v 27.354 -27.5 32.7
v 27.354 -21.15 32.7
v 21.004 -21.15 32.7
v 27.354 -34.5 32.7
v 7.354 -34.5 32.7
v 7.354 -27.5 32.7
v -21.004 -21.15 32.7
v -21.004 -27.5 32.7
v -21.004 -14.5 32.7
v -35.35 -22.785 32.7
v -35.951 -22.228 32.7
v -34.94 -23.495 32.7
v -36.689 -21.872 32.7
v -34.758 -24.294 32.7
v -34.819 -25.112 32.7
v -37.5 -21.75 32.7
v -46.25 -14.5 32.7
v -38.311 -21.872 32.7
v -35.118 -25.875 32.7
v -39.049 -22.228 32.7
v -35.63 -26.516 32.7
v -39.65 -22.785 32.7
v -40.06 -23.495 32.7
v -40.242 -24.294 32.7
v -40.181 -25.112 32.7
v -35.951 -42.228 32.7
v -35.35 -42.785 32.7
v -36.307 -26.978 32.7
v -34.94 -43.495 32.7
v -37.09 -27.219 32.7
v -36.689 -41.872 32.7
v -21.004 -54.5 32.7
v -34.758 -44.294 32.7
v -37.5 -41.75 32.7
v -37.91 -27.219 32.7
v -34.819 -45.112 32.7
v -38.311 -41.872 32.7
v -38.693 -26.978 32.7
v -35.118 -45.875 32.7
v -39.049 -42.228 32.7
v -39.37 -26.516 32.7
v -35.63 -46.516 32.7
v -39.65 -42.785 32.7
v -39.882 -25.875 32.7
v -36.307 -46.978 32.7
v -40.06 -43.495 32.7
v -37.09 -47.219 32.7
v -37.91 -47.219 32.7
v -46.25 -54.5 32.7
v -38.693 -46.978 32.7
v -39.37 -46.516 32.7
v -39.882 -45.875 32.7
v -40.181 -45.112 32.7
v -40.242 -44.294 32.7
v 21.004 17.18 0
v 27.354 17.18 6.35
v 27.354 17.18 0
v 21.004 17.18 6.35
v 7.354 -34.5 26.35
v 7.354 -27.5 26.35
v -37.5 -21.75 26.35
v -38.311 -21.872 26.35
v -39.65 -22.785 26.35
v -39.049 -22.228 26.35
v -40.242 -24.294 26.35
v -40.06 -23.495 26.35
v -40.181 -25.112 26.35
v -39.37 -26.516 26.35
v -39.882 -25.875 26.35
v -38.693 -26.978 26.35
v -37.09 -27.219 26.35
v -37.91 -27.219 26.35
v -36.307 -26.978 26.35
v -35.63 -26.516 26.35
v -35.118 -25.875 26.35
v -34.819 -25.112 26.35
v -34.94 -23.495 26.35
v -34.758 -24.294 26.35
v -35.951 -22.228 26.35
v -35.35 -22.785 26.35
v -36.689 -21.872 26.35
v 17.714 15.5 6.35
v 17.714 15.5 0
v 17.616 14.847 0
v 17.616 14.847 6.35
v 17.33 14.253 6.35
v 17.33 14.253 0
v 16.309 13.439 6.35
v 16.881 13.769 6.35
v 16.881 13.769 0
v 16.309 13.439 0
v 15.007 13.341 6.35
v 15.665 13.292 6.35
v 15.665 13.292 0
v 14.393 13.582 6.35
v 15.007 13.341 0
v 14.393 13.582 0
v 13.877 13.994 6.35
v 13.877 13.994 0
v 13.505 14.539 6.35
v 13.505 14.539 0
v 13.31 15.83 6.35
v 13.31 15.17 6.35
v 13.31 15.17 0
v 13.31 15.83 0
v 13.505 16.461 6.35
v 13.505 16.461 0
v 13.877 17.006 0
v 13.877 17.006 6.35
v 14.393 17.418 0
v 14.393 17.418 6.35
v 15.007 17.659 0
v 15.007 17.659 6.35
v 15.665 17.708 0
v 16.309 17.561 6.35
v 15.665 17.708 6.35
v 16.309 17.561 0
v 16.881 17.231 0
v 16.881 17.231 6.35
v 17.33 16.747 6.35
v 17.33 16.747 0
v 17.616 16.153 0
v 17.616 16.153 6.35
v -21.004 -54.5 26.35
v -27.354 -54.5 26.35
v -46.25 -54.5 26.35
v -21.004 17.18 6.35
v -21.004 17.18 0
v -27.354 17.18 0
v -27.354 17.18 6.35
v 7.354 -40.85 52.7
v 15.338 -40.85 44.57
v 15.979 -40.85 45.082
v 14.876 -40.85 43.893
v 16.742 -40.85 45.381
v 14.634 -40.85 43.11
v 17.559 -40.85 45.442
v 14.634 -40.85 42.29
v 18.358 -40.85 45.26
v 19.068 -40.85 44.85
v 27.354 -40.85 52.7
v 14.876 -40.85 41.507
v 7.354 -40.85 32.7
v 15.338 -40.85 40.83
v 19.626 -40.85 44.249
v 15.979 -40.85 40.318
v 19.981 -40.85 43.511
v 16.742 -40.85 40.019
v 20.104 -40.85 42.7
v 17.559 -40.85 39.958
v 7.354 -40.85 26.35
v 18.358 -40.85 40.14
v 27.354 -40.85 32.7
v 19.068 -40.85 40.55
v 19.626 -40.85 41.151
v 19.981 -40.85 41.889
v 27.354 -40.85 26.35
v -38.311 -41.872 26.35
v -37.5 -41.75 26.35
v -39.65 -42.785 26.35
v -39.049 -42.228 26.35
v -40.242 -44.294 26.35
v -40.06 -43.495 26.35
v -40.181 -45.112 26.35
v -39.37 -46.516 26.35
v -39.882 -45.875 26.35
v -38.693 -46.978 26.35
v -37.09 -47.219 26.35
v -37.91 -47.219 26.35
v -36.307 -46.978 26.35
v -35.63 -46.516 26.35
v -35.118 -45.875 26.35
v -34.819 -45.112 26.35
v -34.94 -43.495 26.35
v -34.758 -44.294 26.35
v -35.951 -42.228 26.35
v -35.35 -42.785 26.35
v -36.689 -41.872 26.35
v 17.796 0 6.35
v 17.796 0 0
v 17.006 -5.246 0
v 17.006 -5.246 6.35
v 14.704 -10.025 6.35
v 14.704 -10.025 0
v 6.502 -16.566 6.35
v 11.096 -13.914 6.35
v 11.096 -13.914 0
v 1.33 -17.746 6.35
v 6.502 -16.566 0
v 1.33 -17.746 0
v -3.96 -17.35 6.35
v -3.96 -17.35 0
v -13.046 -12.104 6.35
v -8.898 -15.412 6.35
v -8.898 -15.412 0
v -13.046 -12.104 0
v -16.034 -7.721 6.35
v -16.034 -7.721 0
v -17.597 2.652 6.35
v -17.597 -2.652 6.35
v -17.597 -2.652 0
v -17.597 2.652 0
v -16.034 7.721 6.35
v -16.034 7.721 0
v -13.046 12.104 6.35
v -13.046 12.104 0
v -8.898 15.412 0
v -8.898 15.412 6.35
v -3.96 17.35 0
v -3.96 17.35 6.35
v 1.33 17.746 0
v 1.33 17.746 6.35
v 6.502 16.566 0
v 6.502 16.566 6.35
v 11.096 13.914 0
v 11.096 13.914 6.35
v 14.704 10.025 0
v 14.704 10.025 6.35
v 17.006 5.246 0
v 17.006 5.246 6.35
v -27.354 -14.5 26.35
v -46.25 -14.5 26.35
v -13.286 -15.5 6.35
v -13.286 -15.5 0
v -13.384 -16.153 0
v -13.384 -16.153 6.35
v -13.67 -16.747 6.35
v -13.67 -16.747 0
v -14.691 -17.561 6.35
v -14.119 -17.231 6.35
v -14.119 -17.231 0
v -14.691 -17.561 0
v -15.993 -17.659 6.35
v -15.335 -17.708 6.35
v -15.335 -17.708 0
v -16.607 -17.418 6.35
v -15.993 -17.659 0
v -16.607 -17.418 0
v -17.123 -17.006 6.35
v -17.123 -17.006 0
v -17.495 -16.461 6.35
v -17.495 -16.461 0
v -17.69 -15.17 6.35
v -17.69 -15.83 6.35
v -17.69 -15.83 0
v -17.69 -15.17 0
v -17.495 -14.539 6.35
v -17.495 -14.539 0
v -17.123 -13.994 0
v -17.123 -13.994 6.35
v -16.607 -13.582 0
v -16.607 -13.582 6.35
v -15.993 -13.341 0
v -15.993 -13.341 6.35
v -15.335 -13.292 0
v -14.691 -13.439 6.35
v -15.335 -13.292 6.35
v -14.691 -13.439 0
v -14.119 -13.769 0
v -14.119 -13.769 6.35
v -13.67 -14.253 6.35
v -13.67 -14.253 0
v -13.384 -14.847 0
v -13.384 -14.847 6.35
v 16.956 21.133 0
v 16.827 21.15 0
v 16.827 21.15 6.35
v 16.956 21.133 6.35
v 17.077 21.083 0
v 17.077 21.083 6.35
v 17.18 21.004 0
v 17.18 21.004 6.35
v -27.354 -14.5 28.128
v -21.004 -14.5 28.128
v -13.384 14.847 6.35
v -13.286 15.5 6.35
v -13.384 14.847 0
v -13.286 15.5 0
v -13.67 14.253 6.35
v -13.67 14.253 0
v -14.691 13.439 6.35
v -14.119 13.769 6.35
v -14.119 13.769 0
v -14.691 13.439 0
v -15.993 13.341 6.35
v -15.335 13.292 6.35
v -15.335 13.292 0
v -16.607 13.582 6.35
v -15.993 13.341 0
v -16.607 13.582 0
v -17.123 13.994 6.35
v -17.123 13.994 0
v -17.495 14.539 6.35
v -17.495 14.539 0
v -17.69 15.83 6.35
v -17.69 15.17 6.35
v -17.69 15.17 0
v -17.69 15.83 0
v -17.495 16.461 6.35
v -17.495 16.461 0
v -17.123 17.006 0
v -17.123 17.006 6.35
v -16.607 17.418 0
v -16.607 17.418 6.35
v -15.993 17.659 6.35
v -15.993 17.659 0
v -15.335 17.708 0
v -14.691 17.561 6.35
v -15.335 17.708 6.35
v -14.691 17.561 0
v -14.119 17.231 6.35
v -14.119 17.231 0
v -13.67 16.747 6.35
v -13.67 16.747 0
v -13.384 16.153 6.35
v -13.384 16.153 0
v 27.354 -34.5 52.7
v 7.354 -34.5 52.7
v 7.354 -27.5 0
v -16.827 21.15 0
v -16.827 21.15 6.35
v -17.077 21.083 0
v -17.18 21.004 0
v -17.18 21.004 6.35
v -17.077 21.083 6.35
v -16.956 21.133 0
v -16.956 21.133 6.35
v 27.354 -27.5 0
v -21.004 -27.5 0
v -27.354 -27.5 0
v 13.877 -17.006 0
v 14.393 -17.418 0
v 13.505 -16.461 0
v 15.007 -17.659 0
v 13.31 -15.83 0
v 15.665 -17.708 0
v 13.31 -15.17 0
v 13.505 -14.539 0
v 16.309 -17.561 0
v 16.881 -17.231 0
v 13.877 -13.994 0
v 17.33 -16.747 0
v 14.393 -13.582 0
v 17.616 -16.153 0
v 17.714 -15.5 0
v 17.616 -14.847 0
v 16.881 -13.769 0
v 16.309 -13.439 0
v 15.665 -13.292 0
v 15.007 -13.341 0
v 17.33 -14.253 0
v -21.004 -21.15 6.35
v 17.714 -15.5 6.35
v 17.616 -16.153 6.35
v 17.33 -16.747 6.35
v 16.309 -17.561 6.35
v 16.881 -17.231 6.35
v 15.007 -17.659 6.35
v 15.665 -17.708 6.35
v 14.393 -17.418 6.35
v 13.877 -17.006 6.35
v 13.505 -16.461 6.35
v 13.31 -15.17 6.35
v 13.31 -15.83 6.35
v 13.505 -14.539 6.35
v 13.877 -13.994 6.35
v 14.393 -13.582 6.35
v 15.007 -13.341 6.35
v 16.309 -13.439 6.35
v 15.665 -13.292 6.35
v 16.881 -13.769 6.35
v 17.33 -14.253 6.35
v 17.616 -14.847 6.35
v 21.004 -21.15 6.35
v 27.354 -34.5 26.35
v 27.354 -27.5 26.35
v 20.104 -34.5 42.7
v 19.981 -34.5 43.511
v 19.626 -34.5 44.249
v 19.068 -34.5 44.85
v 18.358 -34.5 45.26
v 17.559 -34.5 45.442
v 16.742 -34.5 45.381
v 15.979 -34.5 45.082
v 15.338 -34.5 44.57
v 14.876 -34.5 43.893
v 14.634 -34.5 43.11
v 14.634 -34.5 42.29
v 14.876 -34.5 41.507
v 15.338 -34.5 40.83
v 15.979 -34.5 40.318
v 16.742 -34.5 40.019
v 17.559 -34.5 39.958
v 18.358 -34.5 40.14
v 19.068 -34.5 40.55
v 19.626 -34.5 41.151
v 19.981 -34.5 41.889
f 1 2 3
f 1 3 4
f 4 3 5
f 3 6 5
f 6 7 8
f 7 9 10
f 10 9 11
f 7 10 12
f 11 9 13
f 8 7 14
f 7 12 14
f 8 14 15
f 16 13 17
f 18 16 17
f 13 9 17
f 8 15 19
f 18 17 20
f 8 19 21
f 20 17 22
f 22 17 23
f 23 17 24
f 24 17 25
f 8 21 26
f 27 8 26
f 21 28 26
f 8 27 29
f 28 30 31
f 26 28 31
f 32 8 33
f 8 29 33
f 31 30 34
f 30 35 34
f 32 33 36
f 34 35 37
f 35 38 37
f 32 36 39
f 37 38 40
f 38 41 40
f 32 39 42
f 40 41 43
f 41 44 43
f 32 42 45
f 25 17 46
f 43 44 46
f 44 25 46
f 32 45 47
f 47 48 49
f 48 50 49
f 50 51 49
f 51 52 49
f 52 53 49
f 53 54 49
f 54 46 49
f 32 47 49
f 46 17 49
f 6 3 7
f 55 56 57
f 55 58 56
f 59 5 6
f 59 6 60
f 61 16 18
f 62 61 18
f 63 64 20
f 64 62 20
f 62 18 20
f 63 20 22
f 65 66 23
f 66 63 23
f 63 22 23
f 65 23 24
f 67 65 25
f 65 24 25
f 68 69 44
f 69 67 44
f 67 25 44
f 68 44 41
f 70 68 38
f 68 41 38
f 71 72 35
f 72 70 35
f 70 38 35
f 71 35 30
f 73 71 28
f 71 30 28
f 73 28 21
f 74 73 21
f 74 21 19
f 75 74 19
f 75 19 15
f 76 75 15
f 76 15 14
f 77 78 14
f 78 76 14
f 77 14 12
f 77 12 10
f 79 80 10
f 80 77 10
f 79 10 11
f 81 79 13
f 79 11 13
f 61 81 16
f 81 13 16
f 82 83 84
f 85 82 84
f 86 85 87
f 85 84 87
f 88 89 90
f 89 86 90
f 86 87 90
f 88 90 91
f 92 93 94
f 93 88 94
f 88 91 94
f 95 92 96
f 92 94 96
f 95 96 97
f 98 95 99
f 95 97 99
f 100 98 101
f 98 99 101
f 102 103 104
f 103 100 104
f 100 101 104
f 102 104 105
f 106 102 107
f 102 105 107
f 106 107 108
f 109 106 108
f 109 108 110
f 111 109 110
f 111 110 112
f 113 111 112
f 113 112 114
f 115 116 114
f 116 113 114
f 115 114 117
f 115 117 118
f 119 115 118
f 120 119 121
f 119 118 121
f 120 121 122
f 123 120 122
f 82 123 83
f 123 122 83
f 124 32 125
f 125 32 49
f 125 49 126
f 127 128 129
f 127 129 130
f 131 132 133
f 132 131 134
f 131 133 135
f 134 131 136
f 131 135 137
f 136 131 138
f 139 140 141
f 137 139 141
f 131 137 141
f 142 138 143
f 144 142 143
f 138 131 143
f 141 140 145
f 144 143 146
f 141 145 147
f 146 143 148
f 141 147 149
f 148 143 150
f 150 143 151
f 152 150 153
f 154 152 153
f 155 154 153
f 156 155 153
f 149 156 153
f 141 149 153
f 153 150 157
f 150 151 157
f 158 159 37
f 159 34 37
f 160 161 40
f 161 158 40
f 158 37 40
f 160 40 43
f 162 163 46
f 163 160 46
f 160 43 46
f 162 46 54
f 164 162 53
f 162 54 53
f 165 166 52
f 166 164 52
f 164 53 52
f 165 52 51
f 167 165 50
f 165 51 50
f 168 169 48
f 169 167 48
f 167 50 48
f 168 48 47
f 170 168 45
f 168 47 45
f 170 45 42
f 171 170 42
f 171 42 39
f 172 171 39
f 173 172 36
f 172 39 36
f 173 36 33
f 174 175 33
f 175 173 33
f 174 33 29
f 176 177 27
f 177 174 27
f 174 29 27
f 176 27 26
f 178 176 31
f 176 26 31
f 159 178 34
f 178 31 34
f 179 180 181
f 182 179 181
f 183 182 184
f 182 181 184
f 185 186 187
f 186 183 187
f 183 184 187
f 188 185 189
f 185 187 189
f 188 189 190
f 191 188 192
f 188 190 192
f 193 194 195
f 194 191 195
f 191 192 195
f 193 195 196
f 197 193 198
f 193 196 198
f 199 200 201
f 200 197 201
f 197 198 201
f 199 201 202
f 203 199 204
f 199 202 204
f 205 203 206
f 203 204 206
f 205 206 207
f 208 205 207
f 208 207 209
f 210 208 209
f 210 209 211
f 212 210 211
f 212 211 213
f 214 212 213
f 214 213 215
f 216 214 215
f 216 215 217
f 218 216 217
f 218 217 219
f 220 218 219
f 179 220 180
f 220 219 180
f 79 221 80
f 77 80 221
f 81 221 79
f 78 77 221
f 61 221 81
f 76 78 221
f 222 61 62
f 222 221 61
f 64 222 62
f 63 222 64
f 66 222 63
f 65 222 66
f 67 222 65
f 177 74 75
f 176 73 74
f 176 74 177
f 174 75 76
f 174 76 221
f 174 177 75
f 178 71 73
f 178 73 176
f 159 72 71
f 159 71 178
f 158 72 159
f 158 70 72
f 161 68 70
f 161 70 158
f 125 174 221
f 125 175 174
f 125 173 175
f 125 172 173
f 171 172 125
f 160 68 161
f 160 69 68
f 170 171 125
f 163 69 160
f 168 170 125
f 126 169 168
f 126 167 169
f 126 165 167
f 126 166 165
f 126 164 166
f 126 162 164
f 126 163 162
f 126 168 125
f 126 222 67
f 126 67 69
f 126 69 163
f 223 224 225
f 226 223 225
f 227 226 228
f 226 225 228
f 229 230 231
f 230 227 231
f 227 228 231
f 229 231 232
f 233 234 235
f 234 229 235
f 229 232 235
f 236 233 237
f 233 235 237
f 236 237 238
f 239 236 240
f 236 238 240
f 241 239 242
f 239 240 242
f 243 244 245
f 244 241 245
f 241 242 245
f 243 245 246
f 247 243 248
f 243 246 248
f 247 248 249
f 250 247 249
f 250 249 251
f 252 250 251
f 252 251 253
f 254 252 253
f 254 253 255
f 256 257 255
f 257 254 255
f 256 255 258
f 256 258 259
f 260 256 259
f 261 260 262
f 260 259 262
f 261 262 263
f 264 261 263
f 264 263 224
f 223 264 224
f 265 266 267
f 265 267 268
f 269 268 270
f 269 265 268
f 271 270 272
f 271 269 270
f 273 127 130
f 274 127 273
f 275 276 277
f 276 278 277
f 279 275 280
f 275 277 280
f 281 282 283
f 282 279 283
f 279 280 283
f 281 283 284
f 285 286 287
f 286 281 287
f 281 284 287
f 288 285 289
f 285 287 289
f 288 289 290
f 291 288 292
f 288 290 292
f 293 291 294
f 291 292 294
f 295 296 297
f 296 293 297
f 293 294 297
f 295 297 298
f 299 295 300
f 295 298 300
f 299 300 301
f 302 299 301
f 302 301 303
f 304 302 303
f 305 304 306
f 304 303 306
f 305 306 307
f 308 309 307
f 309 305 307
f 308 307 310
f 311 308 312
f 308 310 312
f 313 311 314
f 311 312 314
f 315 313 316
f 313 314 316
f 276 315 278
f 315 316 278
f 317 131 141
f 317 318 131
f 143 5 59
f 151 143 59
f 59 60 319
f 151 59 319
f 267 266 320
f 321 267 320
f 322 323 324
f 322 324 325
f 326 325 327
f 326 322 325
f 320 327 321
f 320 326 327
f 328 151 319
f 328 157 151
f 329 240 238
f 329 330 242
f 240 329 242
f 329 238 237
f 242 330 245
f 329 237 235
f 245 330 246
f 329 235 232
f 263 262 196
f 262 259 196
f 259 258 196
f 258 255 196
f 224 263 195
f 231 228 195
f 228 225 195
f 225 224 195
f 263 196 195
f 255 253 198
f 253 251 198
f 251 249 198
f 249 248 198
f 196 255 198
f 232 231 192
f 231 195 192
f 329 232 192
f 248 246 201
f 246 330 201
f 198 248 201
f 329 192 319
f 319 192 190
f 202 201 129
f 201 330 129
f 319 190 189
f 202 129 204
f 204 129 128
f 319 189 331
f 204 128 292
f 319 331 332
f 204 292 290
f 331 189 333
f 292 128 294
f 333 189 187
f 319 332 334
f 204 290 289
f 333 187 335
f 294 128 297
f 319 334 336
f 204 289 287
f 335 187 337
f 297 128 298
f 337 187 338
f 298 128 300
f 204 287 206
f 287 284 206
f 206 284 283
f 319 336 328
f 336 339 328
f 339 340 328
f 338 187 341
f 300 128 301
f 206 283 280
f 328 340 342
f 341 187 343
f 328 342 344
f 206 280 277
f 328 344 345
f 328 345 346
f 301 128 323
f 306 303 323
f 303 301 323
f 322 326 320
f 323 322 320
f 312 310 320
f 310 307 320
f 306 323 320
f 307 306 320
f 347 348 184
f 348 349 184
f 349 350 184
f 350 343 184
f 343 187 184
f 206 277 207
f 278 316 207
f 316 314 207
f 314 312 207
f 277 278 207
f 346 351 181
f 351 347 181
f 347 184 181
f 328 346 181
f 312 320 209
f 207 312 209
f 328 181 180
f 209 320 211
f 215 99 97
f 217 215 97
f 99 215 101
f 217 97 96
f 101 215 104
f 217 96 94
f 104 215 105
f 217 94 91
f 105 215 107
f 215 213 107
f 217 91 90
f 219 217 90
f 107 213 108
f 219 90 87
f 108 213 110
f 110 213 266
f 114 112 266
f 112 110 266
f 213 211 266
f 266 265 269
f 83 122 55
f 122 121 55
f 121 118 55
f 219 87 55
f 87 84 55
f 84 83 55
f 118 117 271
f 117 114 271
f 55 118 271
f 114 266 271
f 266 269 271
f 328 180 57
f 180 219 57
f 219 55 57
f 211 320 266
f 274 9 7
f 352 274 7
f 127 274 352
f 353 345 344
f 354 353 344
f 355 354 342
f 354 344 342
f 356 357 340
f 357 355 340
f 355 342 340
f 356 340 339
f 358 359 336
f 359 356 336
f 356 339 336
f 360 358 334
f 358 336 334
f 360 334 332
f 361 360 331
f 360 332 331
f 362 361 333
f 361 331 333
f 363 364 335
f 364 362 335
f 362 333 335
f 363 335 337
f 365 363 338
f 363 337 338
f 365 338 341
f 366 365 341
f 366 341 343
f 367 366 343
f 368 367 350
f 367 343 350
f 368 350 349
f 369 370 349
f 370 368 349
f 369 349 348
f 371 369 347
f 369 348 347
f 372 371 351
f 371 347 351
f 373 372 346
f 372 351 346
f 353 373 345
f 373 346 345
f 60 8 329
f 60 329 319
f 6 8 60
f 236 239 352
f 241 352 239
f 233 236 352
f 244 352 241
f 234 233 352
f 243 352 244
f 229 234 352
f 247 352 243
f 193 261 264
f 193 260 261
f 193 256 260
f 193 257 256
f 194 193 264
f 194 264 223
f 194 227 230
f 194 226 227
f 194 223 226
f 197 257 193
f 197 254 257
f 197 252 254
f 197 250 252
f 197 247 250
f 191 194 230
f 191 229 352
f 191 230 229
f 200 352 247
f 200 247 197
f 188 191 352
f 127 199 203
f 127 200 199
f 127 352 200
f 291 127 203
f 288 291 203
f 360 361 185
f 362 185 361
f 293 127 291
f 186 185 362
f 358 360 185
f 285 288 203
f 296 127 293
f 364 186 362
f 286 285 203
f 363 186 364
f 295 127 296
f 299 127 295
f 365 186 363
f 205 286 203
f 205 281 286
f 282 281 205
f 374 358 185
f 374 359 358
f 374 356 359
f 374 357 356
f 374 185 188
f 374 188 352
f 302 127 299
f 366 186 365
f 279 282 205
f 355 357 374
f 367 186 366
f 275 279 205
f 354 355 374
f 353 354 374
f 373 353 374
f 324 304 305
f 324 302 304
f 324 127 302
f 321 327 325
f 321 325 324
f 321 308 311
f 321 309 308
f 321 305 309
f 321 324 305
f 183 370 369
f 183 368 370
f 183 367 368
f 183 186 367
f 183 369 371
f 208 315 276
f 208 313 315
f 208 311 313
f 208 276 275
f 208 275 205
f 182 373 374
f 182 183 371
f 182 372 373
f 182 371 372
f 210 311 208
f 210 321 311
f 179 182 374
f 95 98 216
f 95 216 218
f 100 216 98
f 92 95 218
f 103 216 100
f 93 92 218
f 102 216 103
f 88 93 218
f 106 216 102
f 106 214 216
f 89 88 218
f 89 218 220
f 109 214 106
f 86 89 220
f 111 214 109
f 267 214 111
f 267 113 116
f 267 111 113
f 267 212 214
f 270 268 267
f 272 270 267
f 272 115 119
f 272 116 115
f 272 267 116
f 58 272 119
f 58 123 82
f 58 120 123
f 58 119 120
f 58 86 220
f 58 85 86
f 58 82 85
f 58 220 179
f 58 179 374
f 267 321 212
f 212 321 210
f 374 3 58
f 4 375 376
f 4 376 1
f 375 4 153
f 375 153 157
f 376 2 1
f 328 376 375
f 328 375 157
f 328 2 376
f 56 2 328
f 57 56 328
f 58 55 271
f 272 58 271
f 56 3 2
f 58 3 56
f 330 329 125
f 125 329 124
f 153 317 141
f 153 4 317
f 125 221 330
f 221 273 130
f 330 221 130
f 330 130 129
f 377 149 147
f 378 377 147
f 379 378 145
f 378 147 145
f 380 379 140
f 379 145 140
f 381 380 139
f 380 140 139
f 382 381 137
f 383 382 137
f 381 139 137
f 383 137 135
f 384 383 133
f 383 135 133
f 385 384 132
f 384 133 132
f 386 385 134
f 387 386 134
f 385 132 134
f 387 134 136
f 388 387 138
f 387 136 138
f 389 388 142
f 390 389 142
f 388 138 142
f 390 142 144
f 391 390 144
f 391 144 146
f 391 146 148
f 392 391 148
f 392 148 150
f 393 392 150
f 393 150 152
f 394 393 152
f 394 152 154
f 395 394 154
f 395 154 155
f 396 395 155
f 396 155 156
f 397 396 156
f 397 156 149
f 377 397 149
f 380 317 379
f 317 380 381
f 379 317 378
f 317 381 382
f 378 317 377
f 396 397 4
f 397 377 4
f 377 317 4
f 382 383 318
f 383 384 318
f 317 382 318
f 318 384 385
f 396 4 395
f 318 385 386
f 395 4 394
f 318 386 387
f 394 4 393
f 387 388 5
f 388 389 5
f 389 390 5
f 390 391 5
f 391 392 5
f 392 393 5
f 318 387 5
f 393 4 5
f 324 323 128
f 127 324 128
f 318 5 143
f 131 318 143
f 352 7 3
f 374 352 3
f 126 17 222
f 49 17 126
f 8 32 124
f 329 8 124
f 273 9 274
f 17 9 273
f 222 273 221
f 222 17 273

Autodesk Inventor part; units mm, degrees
sketch "Sketch1" plane through (0, 0, 0) normal (0, 0, 1) x (1, 0, 0)
  line L0 (-21.15, 16.8267) -> (-21.15, -16.8267) projected
  arc A0 (-21.15, -16.8267) -> (-21.0036, -17.1802) centre (-20.65, -16.8267) ccw projected
  line L1 (-21.0036, -17.1802) -> (-17.1802, -21.0036) projected
  arc A1 (-17.1802, -21.0036) -> (-16.8267, -21.15) centre (-16.8267, -20.65) ccw projected
  line L2 (-16.8267, -21.15) -> (16.8267, -21.15) projected
  arc A2 (16.8267, -21.15) -> (17.1802, -21.0036) centre (16.8267, -20.65) ccw projected
  line L3 (17.1802, -21.0036) -> (21.0036, -17.1802) projected
  arc A3 (21.0036, -17.1802) -> (21.15, -16.8267) centre (20.65, -16.8267) ccw projected
  line L4 (21.15, -16.8267) -> (21.15, 16.8267) projected
  arc A4 (21.15, 16.8267) -> (21.0036, 17.1802) centre (20.65, 16.8267) ccw projected
  line L5 (21.0036, 17.1802) -> (17.1802, 21.0036) projected
  arc A5 (17.1802, 21.0036) -> (16.8267, 21.15) centre (16.8267, 20.65) ccw projected
  line L6 (16.8267, 21.15) -> (-16.8267, 21.15) projected
  arc A6 (-16.8267, 21.15) -> (-17.1802, 21.0036) centre (-16.8267, 20.65) ccw projected
  line L7 (-17.1802, 21.0036) -> (-21.0036, 17.1802) projected
  arc A7 (-21.0036, 17.1802) -> (-21.15, 16.8267) centre (-20.65, 16.8267) ccw projected
  circle A8 centre (-15.5, -15.5) radius 1.75 projected
  circle A9 centre (-15.5, 15.5) radius 1.75 projected
  circle A10 centre (15.5, 15.5) radius 1.75 projected
  circle A11 centre (15.5, -15.5) radius 1.75 projected
  circle A12 centre (0, 0) radius 17 projected
  circle A13 centre (15.5, 15.5) radius 2.2144
  circle A14 centre (15.5, -15.5) radius 2.2144
  circle A15 centre (-15.5, -15.5) radius 2.2144
  circle A16 centre (-15.5, 15.5) radius 2.2144
  circle A17 centre (0, 0) radius 17.7962
extrude "Extrusion1" add sketch "Sketch1" along normal blind 6.35 contours A7 L7 A6 L6 A5 L5 A4 L4 A3 L3 A2 L2 A1 L1 A0 L0
sketch "Sketch2" plane through (-16.8267, -21.15, 0) normal (0, -1, 0) x (1, 0, 0)
  line L0 (0, 0) -> (33.6533, 0) projected
  line L1 (33.6533, 0) -> (33.6533, 6.35) projected
  line L2 (0, 6.35) -> (33.6533, 6.35) projected
  line L3 (0, 0) -> (0, 6.35) projected
  line L4 (-10.6733, 32.7) -> (65.5267, 32.7) projected
  line L5 (65.5267, 33.95) -> (-10.6733, 33.95) projected
  line L6 (65.5267, 33.95) -> (65.5267, 39.1) projected
  line L7 (65.5267, 39.1) -> (-10.6733, 39.1) projected
  line L8 (-10.6733, 33.95) -> (-10.6733, 39.1) projected
  line L9 (0, 0) -> (33.6533, 0)
  line L10 (33.6533, 0) -> (33.6533, 32.7)
  line L11 (33.6533, 32.7) -> (0, 32.7)
  line L12 (0, 32.7) -> (0, 0)
  line L13 (-4.1769, 0) -> (-0.3536, 0) projected
  line L14 (-0.3536, 0) -> (-0.3536, 6.35) projected
  line L15 (-4.1769, 6.35) -> (-0.3536, 6.35) projected
  line L16 (-4.1769, 0) -> (-4.1769, 6.35) projected
  line L17 (34.0069, 0) -> (37.8302, 0) projected
  line L18 (37.8302, 0) -> (37.8302, 6.35) projected
  line L19 (34.0069, 6.35) -> (37.8302, 6.35) projected
  line L20 (34.0069, 0) -> (34.0069, 6.35) projected
  line L21 (-4.1769, 0) -> (37.8302, 0)
  line L22 (37.8302, 0) -> (37.8302, 32.7)
  line L23 (37.8302, 32.7) -> (-4.1769, 32.7)
  line L24 (-4.1769, 32.7) -> (-4.1769, 0)
  point P0 (16.8267, 0)
extrude "Extrusion2" add sketch "Sketch2" along normal blind 6.35 contours L3 L2 L1 L0 | L21 L14 L15 L24 L4 L12 L3 | L1 L10 L4 L22 L19 L20 L21 | L12 L4 L10 L2 | L13 L16 L15 L14 | L20 L19 L18 L17
ref_plane "Work Plane1" through (0, -21.15, 0) normal (-1, 0, 0) x (0, 0, 1)
sketch "Sketch4" plane through (-21.0036, -21.15, 0) normal (-1, 0, 0) x (0, 0, 1)
  line L0 (0, 37.9767) -> (0, 4.3233) projected
  line L1 (0, 4.3233) -> (6.35, 4.3233) projected
  line L2 (6.35, 37.9767) -> (6.35, 4.3233) projected
  line L3 (0, 37.9767) -> (6.35, 37.9767) projected
  line L4 (32.7, 0) -> (0, 0) projected
  line L5 (0, 0) -> (0, -6.35) projected
  line L6 (32.7, -6.35) -> (0, -6.35) projected
  line L7 (32.7, 0) -> (32.7, -6.35) projected
  line L8 (6.35, 37.9767) -> (6.35, 4.3233) projected
  line L9 (32.7, 0) -> (32.7, -6.35) projected
  line L10 (0, 0.1464) -> (6.35, 0.1464) projected
  line L11 (0, 38.3302) -> (6.35, 38.3302) projected
  line L12 (0, 38.3302) -> (6.35, 38.3302)
  line L13 (6.35, 38.9462) -> (6.35, 3.3538) projected
  line L14 (6.35, 38.3302) -> (32.7, 0)
  line L15 (0, 0) -> (0, -6.35) projected
  line L16 (32.7, 0) -> (0, 0)
  line L17 (0, 0) -> (0, 38.3302)
  point P0 (0, 21.15)
extrude "Extrusion3" add sketch "Sketch4" along normal blind 6.35
mirror "Mirror1" about plane through (0, -21.15, 0) normal (-1, 0, 0) of "Extrusion3"
sketch "Sketch5" plane through (-16.8267, -27.5, 0) normal (0, -1, 0) x (1, 0, 0)
  line L0 (2.5767, 45.45) -> (8.0767, 45.45) projected
  arc A0 (8.0767, 39.95) -> (8.0767, 45.45) centre (8.0767, 42.7) ccw projected
  line L1 (8.0767, 39.95) -> (2.5767, 39.95) projected
  arc A1 (2.5767, 45.45) -> (2.5767, 39.95) centre (2.5767, 42.7) ccw projected
  line L2 (17.3267, 50.7) -> (-6.6733, 50.7) projected
  line L3 (-6.6733, 50.7) -> (-6.6733, 34.7) projected
  line L4 (-6.6733, 34.7) -> (17.3267, 34.7) projected
  line L5 (17.3267, 34.7) -> (17.3267, 50.7) projected
  line L6 (-10.5269, 32.7) -> (44.1802, 32.7) projected
  line L7 (-10.5269, 0) -> (-10.5269, 32.7) projected
  line L8 (44.1802, 0) -> (-10.5269, 0) projected
  line L9 (44.1802, 0) -> (44.1802, 32.7) projected
  line L10 (37.8302, 32.7) -> (44.1802, 32.7) projected
  line L11 (44.1802, 32.7) -> (24.1802, 32.7)
  line L12 (24.1802, 32.7) -> (24.1802, 26.35)
  line L13 (24.1802, 26.35) -> (44.1802, 26.35)
  line L14 (44.1802, 26.35) -> (44.1802, 32.7)
  point P0 (16.8267, 0)
  dimension "d6" = 20
  dimension "d7" = 6.35
ref_plane "Work Plane2" through (-27.5, -34.5, 33.95) normal (0, -1, 0) x (1, 0, 0)
extrude "Extrusion4" add sketch "Sketch5" along normal up to surface (7 mm away) contours L6 L9 L13 L12
sketch "Sketch6" plane through (7.3536, -34.5, 32.7) normal (0, -1, 0) x (1, 0, 0)
  line L0 (20, 0) -> (20, -6.35) projected
  line L1 (0, 0) -> (20, 0) projected
  line L2 (0, -6.35) -> (0, 0) projected
  line L3 (20, -6.35) -> (0, -6.35) projected
  point P0 (-7.3536, -32.7)
extrude "Extrusion5" add sketch "Sketch6" along normal blind 6.35
sketch "Sketch7" plane through (-27.3536, -21.15, 32.7) normal (0, 0, 1) x (1, 0, 0)
  line L0 (34.7071, -6.35) -> (34.7071, -19.7) projected
  line L1 (54.7071, 0) -> (54.7071, -19.7) projected
  line L2 (34.7071, -19.7) -> (54.7071, -19.7)
  line L3 (54.7071, -19.7) -> (54.7071, -13.35)
  line L4 (54.7071, -13.35) -> (34.7071, -13.35)
  line L5 (34.7071, -13.35) -> (34.7071, -19.7)
  point P0 (27.3536, 21.15)
  dimension "d12" = 6.35
extrude "Extrusion6" add sketch "Sketch7" along normal blind 20
sketch "Sketch8" plane through (7.3536, -40.85, 32.7) normal (0, -1, 0) x (1, 0, 0)
  line L0 (20, 20) -> (0, 20) projected
  line L1 (20, -6.35) -> (20, 20) projected
  line L2 (0, 20) -> (20, 20)
  line L3 (20, 20) -> (20, 0)
  line L4 (20, 0) -> (0, 0)
  line L5 (0, 0) -> (0, 20)
  circle A0 centre (10, 10) radius 2.75
  point P0 (-7.3536, -32.7)
  dimension "d15" = 20
  dimension "d16" = 5.5
extrude "Extrusion7" cut sketch "Sketch8" against normal blind 20 contours A0
ref_plane "Work Plane3" through (-33.9, -14.5, 32.7) normal (0, 0, -1) x (0, 1, 0)
sketch "Sketch9" plane through (-33.9, -14.5, 32.7) normal (0, 0, -1) x (0, 1, 0)
  line L0 (0, -12.35) -> (-1000, -12.35) projected
  line L1 (0, -12.35) -> (0, -7.2) projected
  line L2 (0, -7.2) -> (-1000, -7.2) construction
  line L3 (-1000, -12.35) -> (-1000, -7.2) projected
  line L4 (-1000, 5.15) -> (0, 5.15) construction
  line L5 (-1000, 0) -> (-1000, 5.15) projected
  line L6 (0, 0) -> (-1000, 0) construction
  line L7 (0, 0) -> (0, 5.15) projected
  line L8 (0, 5.15) -> (-40, 5.15) construction
  line L9 (-40, 5.15) -> (-40, -12.35)
  line L10 (-40, -12.35) -> (0, -12.35)
  line L11 (0, -12.35) -> (0, 5.15)
  line L12 (-6.5036, 51.0802) -> (-2.6802, 54.9036) projected
  arc A0 (-6.5036, 51.0802) -> (-6.65, 50.7267) centre (-6.15, 50.7267) ccw projected
  line L13 (-6.65, 50.7267) -> (-6.65, 54.9036) projected
  line L14 (-2.6802, 54.9036) -> (-6.65, 54.9036) projected
  line L15 (31.6802, 54.9036) -> (31.6802, 61.2536) projected
  line L16 (31.6802, 61.2536) -> (-13, 61.2536) projected
  line L17 (-13, 61.2536) -> (-13, 6.5464) projected
  line L18 (31.6802, 6.5464) -> (-13, 6.5464) projected
  line L19 (31.6802, 12.8964) -> (31.6802, 6.5464) projected
  line L20 (35.5036, 16.7198) -> (31.6802, 12.8964) projected
  arc A1 (35.5036, 16.7198) -> (35.65, 17.0733) centre (35.15, 17.0733) ccw projected
  line L21 (35.65, 50.7267) -> (35.65, 17.0733) projected
  arc A2 (35.65, 50.7267) -> (35.5036, 51.0802) centre (35.15, 50.7267) ccw projected
  line L22 (31.6802, 54.9036) -> (35.5036, 51.0802) projected
  line L23 (-6.65, 12.8964) -> (-6.65, 17.0733) projected
  arc A3 (-6.65, 17.0733) -> (-6.5036, 16.7198) centre (-6.15, 17.0733) ccw projected
  line L24 (-2.6802, 12.8964) -> (-6.5036, 16.7198) projected
  line L25 (-2.6802, 12.8964) -> (-6.65, 12.8964) projected
  circle A4 centre (14.5, 33.9) radius 17.7962 projected
  circle A5 centre (30, 18.4) radius 2.2144 projected
  circle A6 centre (-1, 18.4) radius 2.2144 projected
  circle A7 centre (-1, 49.4) radius 2.2144 projected
  circle A8 centre (30, 49.4) radius 2.2144 projected
  line L26 (0, 5.15) -> (-40, 5.15) construction
  line L27 (-40, 5.15) -> (-40, 6.5464)
  line L28 (-40, 6.5464) -> (0, 6.5464)
  line L29 (0, 6.5464) -> (0, 5.15)
  line L30 (-20, -3.6) -> (-40, -3.6) construction
  line L31 (-20, -12.35) -> (-20, 6.5464) construction
  line L32 (-20, -3.6) -> (0, -3.6) construction
  circle A9 centre (-10, -3.6) radius 2.75
  circle A10 centre (-30, -3.6) radius 2.75
  line L33 (0, -12.35) -> (-40, -12.35)
  line L34 (-40, -12.35) -> (-40, 6.5464)
  line L35 (-40, 6.5464) -> (0, 6.5464)
  line L36 (0, 6.5464) -> (0, -12.35)
  dimension "d19" = 40
  dimension "d20" = 5.5
extrude "Extrusion8" add sketch "Sketch9" along normal blind 6.35 contours L0 L9 L27 L28 L18 L29 L7 L11 L1
sketch "Sketch10" plane through (-27.3536, -54.5, 32.7) normal (1, 0, 0) x (0, 0, -1)
  line L0 (-1.6, 40) -> (-1.6, -960) projected
  line L1 (6.35, 27) -> (0, 27) projected
  line L2 (0, 27) -> (0, 0) projected
  line L3 (0, 0) -> (6.35, 0) projected
  line L4 (6.35, 27) -> (6.35, 0) projected
  point P0 (32.7, 54.5)
extrude "Extrusion9" add sketch "Sketch10" along normal blind 6.35
sketch "Sketch11" plane through (-21.0036, -54.5, 32.7) normal (1, 0, 0) x (0, 0, -1)
  line L0 (0, 27) -> (6.35, 27) projected
  line L1 (0, 27) -> (0, 0) projected
  line L2 (0, 0) -> (6.35, 0) projected
  line L3 (6.35, 0) -> (6.35, 27) projected
  line L4 (32.7, 27) -> (6.35, 27) projected
  line L5 (0, 0) -> (6.35, 0) projected
  line L6 (32.7, 27) -> (6.35, 0)
  line L7 (6.35, 27) -> (6.35, 13.65) projected
  line L8 (6.35, 0) -> (6.35, 27)
  line L9 (32.7, 71.6802) -> (32.7, 27) projected
  line L10 (6.35, 27) -> (32.7, 27)
  point P0 (32.7, 54.5)
extrude "Extrusion10" add sketch "Sketch11" against normal blind 6.35 contours L4 L6 L3
sketch "Sketch12" plane through (-27.3536, -21.15, 32.7) normal (1, 0, 0) x (0, 0, -1)
  line L0 (0, 0) -> (4.5715, 6.65) projected
  line L1 (0, 6.65) -> (4.5715, 6.65) projected
  line L2 (0, 6.65) -> (0, 0) projected
  point P0 (32.7, 21.15)
extrude "Extrusion11" add sketch "Sketch12" along normal up to surface (6.35 mm away)
sketch "Sketch13" plane through (27.3536, -27.5, 0) normal (1, 0, 0) x (0, 0, -1)
  line L0 (0, 44.6802) -> (0, 0) projected
  line L1 (-6.35, 44.6802) -> (0, 44.6802) projected
  line L2 (-32.7, 6.35) -> (-6.35, 44.6802) projected
  line L3 (-32.7, 6.35) -> (-32.7, -7) projected
  line L4 (-32.7, -7) -> (-52.7, -7) projected
  line L5 (-52.7, -13.35) -> (-52.7, -7) projected
  line L6 (-26.35, -13.35) -> (-52.7, -13.35) projected
  line L7 (-26.35, 0) -> (-26.35, -13.35) projected
  line L8 (0, 0) -> (-26.35, 0) projected
  line L9 (-26.35, -13.35) -> (0, 0)
  line L10 (-26.35, 0) -> (-26.35, -13.35)
  line L11 (-26.35, 13) -> (-26.35, -27) projected
  line L12 (-32.7, 0) -> (0, 0) projected
  line L13 (-26.35, 0) -> (0, 0)
  point P0 (0, 27.5)
extrude "Extrusion12" add sketch "Sketch13" against normal up to surface (20 mm away) contours L9 L7 L8
sketch "Sketch14" plane through (0, 0, 0) normal (0, 0, -1) x (-1, 0, 0)
  line L0 (-17.1802, -21.0036) -> (-21.0036, -17.1802) projected
  arc A0 (-17.1802, -21.0036) -> (-16.8267, -21.15) centre (-16.8267, -20.65) ccw projected
  line L1 (-16.8267, -21.15) -> (-21.0036, -21.15) projected
  line L2 (-21.0036, -17.1802) -> (-21.0036, -21.15) projected
  line L3 (-21.0036, 17.1802) -> (-27.3536, 17.1802) projected
  line L4 (-27.3536, 17.1802) -> (-27.3536, -27.5) projected
  line L5 (-27.3536, -27.5) -> (-7.3536, -27.5) projected
  line L6 (-7.3536, -27.5) -> (21.0036, -27.5) projected
  line L7 (21.0036, -27.5) -> (27.3536, -27.5) projected
  line L8 (27.3536, 17.1802) -> (27.3536, -27.5) projected
  line L9 (21.0036, 17.1802) -> (27.3536, 17.1802) projected
  line L10 (17.1802, 21.0036) -> (21.0036, 17.1802) projected
  arc A1 (17.1802, 21.0036) -> (16.8267, 21.15) centre (16.8267, 20.65) ccw projected
  line L11 (-16.8267, 21.15) -> (16.8267, 21.15) projected
  arc A2 (-16.8267, 21.15) -> (-17.1802, 21.0036) centre (-16.8267, 20.65) ccw projected
  line L12 (-21.0036, 17.1802) -> (-17.1802, 21.0036) projected
  line L13 (21.0036, -21.15) -> (16.8267, -21.15) projected
  arc A3 (16.8267, -21.15) -> (17.1802, -21.0036) centre (16.8267, -20.65) ccw projected
  line L14 (21.0036, -17.1802) -> (17.1802, -21.0036) projected
  line L15 (21.0036, -17.1802) -> (21.0036, -21.15) projected
  circle A4 centre (0, 0) radius 17.7962 projected
  circle A5 centre (15.5, 15.5) radius 2.2144 projected
  circle A6 centre (15.5, -15.5) radius 2.2144 projected
  circle A7 centre (-15.5, -15.5) radius 2.2144 projected
  circle A8 centre (-15.5, 15.5) radius 2.2144 projected
extrude "Extrusion13" add sketch "Sketch14" against normal up to surface (6.35 mm away) contours A0 L1 L2 L0 | L13 A3 L14 L15
properties part number "motorBracket"
